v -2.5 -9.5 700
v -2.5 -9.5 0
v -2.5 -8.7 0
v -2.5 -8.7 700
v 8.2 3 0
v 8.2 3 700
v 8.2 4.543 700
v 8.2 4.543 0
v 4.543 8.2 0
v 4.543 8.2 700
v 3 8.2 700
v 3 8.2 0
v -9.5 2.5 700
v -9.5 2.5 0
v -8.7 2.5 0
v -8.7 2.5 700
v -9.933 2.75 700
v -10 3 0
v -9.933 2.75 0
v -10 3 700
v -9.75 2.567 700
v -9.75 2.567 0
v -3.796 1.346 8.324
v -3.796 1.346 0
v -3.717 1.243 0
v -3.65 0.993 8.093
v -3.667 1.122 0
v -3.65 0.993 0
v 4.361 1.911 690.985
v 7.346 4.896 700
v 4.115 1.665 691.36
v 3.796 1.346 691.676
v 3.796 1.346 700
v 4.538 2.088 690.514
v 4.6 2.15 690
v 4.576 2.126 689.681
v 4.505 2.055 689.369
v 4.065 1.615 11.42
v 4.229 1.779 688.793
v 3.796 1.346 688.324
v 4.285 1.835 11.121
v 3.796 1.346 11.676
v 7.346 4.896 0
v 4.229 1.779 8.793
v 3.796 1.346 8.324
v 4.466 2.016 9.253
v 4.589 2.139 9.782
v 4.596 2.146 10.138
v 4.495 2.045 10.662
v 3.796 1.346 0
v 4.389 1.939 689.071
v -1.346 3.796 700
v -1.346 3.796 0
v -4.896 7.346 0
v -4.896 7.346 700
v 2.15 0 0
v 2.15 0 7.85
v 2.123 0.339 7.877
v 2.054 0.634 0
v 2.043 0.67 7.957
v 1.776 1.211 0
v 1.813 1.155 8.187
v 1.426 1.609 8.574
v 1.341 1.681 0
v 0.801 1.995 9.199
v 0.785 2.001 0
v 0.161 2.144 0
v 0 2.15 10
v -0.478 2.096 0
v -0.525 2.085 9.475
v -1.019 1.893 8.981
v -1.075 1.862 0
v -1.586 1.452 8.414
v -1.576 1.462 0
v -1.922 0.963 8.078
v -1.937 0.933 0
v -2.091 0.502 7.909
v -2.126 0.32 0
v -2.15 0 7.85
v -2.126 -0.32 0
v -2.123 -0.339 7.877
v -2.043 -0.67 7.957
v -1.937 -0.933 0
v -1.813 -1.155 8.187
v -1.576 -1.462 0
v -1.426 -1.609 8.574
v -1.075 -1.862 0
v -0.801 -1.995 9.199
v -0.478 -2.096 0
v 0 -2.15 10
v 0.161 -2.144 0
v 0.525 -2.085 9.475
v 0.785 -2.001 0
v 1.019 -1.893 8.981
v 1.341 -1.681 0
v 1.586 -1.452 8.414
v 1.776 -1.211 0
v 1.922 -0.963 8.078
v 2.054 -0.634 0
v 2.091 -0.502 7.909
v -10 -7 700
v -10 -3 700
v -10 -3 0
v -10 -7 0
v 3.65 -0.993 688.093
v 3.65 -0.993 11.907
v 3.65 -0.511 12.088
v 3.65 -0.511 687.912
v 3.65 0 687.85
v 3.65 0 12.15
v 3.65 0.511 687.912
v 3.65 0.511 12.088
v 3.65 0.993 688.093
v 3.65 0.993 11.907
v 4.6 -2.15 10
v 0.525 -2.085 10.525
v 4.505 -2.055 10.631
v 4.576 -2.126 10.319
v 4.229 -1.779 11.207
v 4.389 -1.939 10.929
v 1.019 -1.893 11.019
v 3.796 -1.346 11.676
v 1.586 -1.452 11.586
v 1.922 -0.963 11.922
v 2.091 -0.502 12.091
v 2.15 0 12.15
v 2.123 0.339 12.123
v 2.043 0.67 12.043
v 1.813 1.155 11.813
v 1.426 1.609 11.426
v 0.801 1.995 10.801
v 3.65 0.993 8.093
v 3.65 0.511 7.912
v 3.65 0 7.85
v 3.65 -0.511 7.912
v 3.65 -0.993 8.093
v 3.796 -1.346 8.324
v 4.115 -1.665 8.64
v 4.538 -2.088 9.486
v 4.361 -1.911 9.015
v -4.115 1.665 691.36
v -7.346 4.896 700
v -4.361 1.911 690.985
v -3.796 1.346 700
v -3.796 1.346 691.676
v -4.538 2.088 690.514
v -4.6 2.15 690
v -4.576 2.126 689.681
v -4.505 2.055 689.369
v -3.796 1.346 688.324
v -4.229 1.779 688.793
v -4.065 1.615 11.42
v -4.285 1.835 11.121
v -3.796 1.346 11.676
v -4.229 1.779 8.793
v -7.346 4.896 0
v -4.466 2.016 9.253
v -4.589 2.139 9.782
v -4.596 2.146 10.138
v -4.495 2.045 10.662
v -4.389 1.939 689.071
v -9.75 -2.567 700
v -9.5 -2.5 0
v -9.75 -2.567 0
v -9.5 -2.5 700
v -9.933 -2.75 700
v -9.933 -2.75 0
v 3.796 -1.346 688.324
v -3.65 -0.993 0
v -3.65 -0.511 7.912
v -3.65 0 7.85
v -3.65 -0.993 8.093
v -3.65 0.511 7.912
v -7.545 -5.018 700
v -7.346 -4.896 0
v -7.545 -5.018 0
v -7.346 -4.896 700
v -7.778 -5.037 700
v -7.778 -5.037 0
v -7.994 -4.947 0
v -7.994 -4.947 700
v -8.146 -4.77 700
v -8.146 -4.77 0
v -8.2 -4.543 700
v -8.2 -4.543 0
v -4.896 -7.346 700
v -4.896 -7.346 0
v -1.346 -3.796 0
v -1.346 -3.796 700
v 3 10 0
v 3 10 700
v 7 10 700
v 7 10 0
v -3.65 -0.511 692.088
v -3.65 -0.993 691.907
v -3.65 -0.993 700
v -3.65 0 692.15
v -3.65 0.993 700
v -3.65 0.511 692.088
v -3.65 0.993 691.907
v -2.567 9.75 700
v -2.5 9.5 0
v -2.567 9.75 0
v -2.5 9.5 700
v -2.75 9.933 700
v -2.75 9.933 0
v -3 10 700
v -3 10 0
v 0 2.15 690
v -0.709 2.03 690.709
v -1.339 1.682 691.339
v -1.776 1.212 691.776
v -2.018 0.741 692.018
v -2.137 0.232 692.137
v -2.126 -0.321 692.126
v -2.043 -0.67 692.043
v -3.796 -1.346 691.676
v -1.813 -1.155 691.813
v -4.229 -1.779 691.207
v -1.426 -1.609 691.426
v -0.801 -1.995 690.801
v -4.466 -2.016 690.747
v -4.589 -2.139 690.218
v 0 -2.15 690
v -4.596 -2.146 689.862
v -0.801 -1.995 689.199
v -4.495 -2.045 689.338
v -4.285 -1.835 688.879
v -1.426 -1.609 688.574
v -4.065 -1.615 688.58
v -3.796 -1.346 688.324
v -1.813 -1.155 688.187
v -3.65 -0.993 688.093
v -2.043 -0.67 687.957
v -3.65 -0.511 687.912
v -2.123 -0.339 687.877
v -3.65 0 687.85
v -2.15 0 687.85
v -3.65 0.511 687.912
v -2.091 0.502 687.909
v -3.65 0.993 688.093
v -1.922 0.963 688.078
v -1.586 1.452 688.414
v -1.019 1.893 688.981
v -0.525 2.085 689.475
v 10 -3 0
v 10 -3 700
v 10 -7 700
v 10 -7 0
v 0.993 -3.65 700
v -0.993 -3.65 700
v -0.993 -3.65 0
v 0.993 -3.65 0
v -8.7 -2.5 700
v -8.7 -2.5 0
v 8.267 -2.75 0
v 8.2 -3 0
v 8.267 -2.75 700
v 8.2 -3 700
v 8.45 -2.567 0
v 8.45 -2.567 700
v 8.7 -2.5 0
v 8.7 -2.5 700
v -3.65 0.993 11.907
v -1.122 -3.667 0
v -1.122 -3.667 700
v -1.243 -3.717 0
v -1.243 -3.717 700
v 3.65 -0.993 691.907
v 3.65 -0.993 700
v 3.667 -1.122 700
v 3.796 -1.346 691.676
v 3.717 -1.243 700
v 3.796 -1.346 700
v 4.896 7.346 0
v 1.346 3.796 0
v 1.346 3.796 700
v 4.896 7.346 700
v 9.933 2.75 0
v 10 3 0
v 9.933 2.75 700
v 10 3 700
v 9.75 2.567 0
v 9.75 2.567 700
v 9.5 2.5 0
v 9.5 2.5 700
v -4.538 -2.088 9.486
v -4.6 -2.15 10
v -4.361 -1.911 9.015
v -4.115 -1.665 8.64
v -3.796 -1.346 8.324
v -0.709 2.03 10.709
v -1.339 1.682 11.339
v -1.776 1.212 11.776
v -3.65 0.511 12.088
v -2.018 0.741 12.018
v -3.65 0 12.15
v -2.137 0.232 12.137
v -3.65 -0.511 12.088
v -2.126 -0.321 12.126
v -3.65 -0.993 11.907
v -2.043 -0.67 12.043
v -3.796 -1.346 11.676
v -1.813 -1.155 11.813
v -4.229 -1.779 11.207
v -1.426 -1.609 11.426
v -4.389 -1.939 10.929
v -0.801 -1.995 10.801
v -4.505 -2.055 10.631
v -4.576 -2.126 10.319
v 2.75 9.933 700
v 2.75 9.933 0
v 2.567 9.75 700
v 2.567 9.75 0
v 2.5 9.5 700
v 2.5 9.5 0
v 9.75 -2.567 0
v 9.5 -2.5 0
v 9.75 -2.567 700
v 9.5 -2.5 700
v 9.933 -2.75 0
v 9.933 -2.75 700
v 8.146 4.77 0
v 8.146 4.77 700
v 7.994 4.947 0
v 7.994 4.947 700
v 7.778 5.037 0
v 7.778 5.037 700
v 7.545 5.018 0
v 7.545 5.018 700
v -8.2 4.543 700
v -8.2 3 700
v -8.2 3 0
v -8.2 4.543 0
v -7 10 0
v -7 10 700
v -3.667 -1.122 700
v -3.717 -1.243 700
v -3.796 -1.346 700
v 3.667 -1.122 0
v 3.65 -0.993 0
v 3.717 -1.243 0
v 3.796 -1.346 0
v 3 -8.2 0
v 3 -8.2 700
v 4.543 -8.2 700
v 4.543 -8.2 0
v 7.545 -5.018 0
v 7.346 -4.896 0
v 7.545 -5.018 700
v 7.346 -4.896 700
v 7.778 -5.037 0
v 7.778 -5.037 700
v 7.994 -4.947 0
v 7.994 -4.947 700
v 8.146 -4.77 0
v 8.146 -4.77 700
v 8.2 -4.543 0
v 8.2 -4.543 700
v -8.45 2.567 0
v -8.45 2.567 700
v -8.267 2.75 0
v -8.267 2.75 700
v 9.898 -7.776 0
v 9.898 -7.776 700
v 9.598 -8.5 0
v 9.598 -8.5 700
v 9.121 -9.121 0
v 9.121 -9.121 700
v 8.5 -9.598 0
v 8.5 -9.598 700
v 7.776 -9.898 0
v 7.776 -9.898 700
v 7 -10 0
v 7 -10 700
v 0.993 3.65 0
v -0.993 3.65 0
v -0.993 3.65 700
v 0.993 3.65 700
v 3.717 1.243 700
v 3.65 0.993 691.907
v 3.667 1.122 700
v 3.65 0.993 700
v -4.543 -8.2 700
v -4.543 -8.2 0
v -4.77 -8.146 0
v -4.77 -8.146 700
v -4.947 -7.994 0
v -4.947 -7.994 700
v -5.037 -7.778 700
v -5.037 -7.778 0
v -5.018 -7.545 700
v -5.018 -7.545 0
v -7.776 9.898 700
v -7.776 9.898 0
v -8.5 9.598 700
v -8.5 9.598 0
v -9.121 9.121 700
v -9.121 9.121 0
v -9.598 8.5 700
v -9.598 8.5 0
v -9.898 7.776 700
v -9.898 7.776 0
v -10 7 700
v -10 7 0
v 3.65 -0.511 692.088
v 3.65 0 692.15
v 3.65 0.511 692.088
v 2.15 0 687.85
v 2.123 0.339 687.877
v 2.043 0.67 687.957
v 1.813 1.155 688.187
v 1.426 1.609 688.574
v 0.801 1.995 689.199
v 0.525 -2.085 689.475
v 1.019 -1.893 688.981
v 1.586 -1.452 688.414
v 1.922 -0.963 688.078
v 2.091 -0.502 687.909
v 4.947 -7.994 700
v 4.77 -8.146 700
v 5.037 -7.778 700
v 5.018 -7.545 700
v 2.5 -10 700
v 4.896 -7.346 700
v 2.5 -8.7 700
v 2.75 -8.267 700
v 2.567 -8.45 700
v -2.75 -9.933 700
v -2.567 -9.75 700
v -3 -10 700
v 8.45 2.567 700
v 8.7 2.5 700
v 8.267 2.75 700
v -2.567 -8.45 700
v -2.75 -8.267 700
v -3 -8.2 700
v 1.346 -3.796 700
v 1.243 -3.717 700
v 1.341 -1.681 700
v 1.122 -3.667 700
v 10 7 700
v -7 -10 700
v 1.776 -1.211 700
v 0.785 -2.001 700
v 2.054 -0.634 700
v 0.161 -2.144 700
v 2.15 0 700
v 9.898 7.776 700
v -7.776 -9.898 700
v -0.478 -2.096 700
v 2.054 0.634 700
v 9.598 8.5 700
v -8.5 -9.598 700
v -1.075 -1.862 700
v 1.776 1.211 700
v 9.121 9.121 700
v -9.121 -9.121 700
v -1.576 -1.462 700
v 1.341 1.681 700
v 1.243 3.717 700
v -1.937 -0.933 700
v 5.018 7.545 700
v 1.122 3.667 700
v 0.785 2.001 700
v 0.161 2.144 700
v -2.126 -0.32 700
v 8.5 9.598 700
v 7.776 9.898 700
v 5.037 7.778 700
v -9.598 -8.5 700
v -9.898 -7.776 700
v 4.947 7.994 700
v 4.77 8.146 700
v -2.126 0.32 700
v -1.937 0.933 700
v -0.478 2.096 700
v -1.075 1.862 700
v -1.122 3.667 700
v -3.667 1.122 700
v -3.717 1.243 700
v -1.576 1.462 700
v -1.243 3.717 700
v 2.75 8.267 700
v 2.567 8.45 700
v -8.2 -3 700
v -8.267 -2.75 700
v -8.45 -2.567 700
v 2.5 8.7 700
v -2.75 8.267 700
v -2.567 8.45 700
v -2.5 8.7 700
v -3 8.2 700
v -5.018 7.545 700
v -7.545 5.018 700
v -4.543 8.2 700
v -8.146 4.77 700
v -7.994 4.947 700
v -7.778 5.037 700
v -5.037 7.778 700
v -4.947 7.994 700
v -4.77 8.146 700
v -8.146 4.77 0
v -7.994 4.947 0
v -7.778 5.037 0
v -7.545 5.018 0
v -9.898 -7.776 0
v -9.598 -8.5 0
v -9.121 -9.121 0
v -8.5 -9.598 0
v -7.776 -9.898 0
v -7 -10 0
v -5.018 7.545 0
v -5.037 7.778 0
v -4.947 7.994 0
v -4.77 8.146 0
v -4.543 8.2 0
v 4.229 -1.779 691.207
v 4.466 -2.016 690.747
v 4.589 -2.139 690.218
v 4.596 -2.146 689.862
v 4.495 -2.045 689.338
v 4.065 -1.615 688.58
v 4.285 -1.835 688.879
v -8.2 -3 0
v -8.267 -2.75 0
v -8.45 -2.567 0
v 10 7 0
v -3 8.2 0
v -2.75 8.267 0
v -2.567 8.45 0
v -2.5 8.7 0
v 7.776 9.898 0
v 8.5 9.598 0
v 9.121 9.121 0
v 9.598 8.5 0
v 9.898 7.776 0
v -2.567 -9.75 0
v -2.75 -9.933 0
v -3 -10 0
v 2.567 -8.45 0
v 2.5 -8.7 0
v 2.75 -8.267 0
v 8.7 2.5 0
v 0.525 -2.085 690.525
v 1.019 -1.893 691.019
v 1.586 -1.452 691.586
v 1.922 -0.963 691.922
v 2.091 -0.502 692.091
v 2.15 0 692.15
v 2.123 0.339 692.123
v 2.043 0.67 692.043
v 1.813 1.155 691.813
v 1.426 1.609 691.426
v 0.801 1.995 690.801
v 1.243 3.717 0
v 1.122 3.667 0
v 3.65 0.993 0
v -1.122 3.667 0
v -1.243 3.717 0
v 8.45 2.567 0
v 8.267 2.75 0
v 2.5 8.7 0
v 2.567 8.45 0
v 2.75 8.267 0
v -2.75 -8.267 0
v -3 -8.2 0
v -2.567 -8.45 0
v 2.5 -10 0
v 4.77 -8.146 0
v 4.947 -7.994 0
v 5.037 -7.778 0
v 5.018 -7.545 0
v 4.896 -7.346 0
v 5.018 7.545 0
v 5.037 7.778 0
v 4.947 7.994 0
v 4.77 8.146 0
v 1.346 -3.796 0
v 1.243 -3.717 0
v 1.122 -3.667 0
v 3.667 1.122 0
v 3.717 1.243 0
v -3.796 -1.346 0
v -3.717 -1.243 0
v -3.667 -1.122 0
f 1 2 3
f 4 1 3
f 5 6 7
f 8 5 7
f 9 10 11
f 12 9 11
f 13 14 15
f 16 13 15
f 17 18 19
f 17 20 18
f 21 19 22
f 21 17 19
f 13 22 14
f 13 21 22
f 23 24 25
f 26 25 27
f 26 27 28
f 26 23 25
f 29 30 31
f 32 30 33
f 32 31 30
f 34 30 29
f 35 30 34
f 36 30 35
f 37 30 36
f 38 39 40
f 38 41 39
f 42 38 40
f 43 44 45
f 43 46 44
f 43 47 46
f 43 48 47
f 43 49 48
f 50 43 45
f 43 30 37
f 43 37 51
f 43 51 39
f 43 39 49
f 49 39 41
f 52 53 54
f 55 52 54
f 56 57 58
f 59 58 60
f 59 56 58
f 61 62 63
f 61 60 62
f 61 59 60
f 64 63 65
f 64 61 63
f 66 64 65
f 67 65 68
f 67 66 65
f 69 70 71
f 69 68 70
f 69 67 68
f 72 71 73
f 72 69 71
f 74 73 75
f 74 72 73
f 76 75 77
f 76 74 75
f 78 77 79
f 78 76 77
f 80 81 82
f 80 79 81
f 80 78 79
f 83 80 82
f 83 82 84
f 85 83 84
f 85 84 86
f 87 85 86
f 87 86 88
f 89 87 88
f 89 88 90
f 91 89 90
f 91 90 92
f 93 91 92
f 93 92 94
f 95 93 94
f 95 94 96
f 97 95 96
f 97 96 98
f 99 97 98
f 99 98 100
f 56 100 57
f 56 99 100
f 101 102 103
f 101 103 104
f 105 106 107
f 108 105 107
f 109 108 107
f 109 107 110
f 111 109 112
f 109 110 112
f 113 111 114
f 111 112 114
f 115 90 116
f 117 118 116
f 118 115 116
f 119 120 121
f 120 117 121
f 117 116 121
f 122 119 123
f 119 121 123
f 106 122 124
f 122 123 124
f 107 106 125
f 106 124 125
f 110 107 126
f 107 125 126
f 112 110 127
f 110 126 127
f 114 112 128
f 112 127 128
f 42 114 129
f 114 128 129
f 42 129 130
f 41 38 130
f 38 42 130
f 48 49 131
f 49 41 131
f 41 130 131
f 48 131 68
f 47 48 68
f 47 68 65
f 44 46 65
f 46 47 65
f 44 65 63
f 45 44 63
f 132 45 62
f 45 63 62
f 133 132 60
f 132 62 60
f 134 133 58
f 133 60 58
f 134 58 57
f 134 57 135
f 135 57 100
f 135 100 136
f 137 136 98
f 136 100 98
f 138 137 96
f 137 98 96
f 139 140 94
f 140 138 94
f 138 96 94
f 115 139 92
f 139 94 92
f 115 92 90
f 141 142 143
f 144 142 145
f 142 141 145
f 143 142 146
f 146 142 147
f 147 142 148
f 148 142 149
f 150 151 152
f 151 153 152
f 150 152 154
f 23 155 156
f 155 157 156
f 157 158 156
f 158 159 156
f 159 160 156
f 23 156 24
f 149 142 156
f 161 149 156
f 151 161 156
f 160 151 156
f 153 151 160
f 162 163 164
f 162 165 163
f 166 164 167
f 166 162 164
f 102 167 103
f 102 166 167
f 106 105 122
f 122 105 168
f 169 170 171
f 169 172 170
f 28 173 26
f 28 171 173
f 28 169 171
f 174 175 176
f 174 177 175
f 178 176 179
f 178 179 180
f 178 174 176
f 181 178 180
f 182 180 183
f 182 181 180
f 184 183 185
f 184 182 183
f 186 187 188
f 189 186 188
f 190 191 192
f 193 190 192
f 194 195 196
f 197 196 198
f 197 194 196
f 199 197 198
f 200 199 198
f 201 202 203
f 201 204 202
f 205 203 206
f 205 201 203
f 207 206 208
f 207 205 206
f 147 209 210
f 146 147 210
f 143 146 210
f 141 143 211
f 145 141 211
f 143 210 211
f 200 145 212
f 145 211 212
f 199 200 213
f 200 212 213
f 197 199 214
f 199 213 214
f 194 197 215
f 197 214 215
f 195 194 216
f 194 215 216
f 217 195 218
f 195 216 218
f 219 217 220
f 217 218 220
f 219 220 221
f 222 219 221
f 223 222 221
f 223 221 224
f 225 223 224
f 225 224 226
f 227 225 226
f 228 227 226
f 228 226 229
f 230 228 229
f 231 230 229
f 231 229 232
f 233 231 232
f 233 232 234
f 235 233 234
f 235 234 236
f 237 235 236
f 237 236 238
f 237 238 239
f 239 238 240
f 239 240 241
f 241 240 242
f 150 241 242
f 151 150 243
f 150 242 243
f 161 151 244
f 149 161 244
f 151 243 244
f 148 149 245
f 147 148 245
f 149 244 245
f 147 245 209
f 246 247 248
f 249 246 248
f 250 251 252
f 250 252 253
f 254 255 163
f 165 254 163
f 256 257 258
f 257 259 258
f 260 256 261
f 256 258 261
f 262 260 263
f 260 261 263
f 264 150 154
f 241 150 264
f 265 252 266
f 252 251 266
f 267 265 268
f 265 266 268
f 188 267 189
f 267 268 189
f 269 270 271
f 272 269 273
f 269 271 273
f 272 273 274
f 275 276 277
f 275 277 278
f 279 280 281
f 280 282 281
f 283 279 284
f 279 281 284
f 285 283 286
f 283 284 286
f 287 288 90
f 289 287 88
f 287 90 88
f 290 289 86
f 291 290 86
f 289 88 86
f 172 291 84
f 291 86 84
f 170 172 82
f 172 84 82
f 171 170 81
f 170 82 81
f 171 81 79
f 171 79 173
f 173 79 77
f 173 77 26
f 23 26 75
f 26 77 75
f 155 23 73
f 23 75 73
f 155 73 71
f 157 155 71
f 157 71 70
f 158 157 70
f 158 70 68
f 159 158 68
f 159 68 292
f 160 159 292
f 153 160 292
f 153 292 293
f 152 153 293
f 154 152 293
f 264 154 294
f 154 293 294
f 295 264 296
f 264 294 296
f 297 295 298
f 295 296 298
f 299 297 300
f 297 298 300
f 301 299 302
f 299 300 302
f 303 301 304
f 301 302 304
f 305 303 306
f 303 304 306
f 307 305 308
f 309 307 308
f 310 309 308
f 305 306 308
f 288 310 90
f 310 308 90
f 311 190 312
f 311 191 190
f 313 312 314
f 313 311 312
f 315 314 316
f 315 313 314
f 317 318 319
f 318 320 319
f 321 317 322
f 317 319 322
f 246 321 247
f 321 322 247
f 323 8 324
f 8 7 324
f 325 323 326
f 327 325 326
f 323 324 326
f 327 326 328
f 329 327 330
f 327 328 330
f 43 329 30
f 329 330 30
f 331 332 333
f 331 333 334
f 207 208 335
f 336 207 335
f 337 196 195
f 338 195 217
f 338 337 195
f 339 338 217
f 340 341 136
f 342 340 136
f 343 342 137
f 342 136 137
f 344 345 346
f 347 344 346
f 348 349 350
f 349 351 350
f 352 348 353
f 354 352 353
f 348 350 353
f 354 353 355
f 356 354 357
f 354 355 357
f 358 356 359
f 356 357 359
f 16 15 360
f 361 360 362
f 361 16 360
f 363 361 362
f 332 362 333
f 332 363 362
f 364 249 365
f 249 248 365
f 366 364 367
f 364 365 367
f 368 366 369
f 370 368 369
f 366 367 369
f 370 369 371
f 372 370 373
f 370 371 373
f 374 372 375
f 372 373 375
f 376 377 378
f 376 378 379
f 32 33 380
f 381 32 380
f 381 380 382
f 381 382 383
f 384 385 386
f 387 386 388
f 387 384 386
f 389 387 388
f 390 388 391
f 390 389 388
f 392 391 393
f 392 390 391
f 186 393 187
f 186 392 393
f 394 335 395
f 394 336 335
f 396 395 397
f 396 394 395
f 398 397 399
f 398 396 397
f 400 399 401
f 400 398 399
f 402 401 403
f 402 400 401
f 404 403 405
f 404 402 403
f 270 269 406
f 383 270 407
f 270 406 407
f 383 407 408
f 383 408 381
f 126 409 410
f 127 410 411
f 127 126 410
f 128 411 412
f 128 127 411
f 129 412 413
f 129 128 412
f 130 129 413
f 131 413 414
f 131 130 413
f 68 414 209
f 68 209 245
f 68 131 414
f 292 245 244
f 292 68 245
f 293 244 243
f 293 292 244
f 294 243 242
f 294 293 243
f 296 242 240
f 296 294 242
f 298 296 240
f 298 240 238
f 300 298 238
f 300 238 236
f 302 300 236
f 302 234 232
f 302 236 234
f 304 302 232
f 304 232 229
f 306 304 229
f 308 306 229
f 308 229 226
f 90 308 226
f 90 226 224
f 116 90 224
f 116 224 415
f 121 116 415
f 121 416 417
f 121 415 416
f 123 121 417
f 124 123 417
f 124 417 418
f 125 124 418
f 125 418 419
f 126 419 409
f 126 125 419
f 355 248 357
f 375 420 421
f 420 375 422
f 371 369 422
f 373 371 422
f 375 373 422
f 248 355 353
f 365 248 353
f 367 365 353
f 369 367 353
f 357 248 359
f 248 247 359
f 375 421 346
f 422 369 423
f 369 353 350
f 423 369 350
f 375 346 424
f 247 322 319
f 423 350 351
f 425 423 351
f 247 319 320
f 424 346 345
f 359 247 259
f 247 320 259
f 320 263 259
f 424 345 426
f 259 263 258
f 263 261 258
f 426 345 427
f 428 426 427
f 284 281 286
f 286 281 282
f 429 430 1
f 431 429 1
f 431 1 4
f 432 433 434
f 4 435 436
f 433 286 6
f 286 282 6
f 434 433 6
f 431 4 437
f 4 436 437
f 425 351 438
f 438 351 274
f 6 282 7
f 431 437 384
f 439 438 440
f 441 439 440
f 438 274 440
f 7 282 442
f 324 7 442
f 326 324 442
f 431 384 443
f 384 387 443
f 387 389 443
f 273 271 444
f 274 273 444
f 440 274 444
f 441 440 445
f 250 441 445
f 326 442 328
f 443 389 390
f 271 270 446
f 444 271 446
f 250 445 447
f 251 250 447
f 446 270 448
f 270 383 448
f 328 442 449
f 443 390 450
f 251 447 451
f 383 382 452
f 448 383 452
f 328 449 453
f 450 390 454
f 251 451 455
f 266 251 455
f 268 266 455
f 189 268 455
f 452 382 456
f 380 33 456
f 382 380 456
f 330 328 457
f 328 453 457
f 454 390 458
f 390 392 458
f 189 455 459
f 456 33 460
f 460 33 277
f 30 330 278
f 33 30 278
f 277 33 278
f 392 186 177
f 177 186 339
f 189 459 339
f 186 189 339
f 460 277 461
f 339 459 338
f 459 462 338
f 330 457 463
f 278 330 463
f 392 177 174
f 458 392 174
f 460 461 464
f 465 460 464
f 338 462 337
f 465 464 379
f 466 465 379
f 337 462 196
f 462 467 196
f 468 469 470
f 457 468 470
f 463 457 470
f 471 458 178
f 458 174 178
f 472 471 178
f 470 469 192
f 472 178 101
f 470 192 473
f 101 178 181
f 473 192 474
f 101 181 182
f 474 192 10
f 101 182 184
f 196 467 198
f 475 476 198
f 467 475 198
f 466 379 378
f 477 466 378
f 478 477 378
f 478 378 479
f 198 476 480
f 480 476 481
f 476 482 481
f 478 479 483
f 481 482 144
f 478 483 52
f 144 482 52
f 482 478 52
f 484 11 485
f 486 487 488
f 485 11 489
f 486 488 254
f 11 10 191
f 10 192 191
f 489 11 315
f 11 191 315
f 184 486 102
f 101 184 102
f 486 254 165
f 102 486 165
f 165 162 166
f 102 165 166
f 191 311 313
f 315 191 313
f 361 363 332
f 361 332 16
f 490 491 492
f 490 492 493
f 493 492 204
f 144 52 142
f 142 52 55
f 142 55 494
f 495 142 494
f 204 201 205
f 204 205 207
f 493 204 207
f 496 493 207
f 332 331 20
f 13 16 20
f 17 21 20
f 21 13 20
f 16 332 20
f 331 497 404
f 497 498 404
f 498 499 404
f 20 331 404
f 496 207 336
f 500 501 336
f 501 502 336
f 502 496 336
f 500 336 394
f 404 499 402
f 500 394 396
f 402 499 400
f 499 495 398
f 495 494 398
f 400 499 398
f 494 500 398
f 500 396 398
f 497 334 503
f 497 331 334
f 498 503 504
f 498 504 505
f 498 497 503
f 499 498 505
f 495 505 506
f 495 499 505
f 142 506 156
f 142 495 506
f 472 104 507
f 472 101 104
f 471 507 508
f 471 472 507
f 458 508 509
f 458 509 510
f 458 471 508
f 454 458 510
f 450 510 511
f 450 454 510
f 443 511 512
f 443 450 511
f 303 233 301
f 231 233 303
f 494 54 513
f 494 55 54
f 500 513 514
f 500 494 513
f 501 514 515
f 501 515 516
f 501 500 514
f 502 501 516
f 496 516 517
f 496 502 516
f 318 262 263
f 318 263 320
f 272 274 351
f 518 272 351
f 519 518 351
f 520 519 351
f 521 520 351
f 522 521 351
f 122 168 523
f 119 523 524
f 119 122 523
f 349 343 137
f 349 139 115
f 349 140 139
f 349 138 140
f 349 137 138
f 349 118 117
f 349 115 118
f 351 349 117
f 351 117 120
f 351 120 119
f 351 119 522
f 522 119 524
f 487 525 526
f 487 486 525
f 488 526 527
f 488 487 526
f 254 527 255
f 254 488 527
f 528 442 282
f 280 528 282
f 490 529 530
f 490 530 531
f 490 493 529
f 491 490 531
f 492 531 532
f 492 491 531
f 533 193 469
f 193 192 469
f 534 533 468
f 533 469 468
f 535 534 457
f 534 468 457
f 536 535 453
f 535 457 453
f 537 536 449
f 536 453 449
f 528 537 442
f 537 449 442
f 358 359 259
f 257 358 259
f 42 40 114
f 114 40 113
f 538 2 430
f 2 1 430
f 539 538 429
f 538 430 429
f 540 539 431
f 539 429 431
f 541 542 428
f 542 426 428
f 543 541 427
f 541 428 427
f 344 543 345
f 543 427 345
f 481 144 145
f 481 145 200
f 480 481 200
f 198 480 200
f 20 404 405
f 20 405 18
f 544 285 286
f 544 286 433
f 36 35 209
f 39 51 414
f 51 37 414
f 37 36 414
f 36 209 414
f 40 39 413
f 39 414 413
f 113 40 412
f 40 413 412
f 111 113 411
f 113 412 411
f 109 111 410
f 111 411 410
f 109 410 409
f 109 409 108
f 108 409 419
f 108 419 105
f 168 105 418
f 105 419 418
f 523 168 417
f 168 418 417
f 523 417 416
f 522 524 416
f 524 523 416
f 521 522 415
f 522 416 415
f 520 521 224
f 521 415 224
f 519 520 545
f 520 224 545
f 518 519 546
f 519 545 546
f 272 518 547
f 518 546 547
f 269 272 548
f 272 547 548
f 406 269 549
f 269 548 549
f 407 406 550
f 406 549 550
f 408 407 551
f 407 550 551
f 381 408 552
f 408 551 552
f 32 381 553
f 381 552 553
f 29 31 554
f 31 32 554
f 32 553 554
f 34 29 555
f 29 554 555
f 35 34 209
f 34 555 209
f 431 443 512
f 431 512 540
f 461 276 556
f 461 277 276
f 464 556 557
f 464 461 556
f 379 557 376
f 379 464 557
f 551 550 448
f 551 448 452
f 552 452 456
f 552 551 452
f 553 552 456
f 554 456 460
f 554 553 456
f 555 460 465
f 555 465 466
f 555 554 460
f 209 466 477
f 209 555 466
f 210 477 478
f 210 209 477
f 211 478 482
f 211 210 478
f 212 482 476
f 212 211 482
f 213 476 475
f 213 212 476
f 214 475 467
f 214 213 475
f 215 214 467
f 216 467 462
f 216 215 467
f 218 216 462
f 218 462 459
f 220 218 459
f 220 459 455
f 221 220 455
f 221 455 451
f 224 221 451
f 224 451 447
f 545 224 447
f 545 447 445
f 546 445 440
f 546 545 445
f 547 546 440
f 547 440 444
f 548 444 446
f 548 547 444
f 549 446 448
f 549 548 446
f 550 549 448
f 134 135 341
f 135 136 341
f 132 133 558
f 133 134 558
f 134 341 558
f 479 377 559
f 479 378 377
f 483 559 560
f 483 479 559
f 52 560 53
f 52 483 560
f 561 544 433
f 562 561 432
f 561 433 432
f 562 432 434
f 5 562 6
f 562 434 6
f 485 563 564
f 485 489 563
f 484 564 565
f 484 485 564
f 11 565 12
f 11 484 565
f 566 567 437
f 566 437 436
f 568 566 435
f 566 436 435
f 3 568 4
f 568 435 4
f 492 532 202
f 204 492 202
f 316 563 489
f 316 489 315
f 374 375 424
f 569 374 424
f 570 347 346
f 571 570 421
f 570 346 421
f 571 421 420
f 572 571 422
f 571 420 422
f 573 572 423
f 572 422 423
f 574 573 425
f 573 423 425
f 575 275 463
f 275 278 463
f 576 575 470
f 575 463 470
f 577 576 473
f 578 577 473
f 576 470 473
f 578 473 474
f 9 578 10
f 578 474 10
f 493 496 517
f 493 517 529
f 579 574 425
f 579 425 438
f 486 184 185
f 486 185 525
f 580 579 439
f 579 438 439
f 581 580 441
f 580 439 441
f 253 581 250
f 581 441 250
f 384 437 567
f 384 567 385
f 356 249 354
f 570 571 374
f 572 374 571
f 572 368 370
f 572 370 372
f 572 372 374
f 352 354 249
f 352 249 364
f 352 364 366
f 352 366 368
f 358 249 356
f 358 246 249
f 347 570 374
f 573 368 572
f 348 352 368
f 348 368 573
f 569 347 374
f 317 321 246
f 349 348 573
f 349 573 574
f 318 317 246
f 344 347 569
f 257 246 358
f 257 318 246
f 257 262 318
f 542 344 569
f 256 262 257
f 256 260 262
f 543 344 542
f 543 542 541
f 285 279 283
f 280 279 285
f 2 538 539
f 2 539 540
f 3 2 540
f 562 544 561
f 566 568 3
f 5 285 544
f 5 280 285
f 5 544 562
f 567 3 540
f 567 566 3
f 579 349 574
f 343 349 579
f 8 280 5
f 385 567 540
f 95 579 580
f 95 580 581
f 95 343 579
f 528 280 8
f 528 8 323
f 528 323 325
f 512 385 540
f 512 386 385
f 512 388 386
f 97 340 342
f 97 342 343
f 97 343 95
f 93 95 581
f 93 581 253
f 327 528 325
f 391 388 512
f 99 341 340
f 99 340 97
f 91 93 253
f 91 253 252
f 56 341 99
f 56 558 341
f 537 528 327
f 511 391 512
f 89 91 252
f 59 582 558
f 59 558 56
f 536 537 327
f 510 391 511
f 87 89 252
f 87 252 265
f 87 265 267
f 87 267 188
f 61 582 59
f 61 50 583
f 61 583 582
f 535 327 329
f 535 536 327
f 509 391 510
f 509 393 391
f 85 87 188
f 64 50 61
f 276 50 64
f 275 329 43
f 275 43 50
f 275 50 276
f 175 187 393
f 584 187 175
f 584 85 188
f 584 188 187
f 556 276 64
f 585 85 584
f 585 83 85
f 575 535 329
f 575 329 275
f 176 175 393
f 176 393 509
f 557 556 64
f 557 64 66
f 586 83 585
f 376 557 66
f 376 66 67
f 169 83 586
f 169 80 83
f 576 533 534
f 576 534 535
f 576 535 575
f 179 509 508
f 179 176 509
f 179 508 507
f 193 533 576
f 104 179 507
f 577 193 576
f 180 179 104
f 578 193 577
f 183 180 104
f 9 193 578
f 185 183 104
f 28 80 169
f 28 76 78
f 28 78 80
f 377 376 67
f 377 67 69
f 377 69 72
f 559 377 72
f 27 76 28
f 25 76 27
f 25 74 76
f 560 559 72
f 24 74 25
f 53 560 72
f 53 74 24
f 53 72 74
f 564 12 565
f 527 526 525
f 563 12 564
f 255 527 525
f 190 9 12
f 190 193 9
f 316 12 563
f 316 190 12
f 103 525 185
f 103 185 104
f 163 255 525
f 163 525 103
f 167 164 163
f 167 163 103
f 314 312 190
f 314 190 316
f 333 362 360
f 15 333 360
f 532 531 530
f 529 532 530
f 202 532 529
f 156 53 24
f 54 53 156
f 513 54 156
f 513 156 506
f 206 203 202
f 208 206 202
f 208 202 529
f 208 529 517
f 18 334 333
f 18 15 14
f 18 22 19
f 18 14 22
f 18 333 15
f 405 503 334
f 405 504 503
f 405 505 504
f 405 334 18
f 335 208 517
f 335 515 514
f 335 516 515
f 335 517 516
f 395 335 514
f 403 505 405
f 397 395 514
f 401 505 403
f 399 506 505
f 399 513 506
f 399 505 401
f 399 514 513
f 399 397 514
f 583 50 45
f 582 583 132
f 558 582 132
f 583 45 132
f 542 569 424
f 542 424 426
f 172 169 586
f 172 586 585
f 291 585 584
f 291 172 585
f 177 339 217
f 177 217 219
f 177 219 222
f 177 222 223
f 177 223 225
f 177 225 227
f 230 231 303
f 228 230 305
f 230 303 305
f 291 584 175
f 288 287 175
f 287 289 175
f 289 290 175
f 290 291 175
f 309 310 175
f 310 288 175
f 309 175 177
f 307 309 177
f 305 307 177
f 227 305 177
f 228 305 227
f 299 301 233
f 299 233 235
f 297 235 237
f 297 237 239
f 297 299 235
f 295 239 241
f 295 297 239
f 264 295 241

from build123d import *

# Parameters (mm, degrees)
SKETCH1_W           = 7.3
SKETCH1_H           = 7.3
SKETCH1_R           = 2.15
BOSS_EXTRUDE1_DEPTH = 700
BOSS_EXTRUDE2_DEPTH = 700
FILLET4_R           = 3
FILLET5_R           = 0.5
FILLET6_R           = 0.5
FILLET7_R           = 0.5
SKETCH3_R           = 2.15
CUT_EXTRUDE1_DEPTH  = 701.204486204
SKETCH4_R           = 2.15
CUT_EXTRUDE2_DEPTH  = 701.204486304
SKETCH5_R           = 2.15
CUT_EXTRUDE3_DEPTH  = 701.204486304
SKETCH6_R           = 2.15
CUT_EXTRUDE4_DEPTH  = 701.204486304


with BuildPart() as part:
    # Sketch1 → Boss-Extrude1 (new body)
    with BuildSketch(Plane.XY):
        Rectangle(SKETCH1_W, SKETCH1_H)
        Circle(SKETCH1_R, mode=Mode.SUBTRACT)
    extrude(amount=BOSS_EXTRUDE1_DEPTH)

    # Sketch2 → Boss-Extrude2 (add)
    with BuildSketch(Plane.XY):
        Polygon((3.65, 3.65), (1.2, 3.65), (5.750000001, 8.200000001), (2.500000001, 8.200000001), (2.500000001, 10.000000001), (10.000000001, 10.000000001), (10.000000001, 2.500000001), (8.200000001, 2.500000001), (8.200000001, 5.750000001), (3.65, 1.2), align=None)
        Polygon((-3.65, 3.65), (-1.2, 3.65), (-5.750000001, 8.200000001), (-2.500000001, 8.200000001), (-2.500000001, 10.000000001), (-10.000000001, 10.000000001), (-10.000000001, 2.500000001), (-8.200000001, 2.500000001), (-8.200000001, 5.750000001), (-3.65, 1.2), align=None)
        Polygon((-3.65, -3.65), (-3.65, -1.2), (-8.200000001, -5.750000001), (-8.200000001, -2.500000001), (-10.000000001, -2.500000001), (-10.000000001, -10.000000001), (-2.500000001, -10.000000001), (-2.500000001, -8.200000001), (-5.750000001, -8.200000001), (-1.2, -3.65), align=None)
        Polygon((3.65, -3.65), (3.65, -1.2), (8.200000001, -5.750000001), (8.200000001, -2.500000001), (10.000000001, -2.500000001), (10.000000001, -10.000000001), (2.500000001, -10.000000001), (2.500000001, -8.200000001), (5.750000001, -8.200000001), (1.2, -3.65), align=None)
    extrude(amount=BOSS_EXTRUDE2_DEPTH)

    # Fillet4
    fillet4_edges = [part.edges().sort_by_distance(p)[0] for p in [
        (10.000000001, 10.000000001, 350),
        (-10.000000001, 10.000000001, 350),
        (-10.000000001, -10.000000001, 350),
        (10.000000001, -10.000000001, 350),
    ]]
    fillet(fillet4_edges, radius=FILLET4_R)

    # Fillet5
    fillet5_edges = [part.edges().sort_by_distance(p)[0] for p in [
        (8.200000001, 2.500000001, 350),
        (10.000000001, 2.500000001, 350),
        (2.500000001, 10.000000001, 350),
        (2.500000001, 8.200000001, 350),
        (-2.500000001, 8.200000001, 350),
        (-2.500000001, 10.000000001, 350),
        (-10.000000001, 2.500000001, 350),
        (-8.200000001, 2.500000001, 350),
        (-8.200000001, -2.500000001, 350),
        (-10.000000001, -2.500000001, 350),
        (-2.500000001, -10.000000001, 350),
        (-2.500000001, -8.200000001, 350),
        (2.500000001, -8.200000001, 350),
        (10.000000001, -2.500000001, 350),
        (8.200000001, -2.500000001, 350),
    ]]
    fillet(fillet5_edges, radius=FILLET5_R)

    # Fillet6
    fillet6_edges = [part.edges().sort_by_distance(p)[0] for p in [
        (3.65, 1.2, 350),
        (1.2, 3.65, 350),
        (-3.65, 1.2, 350),
        (-1.2, 3.65, 350),
        (-1.2, -3.65, 350),
        (-3.65, -1.2, 350),
        (1.2, -3.65, 350),
        (3.65, -1.2, 350),
    ]]
    fillet(fillet6_edges, radius=FILLET6_R)

    # Fillet7
    fillet7_edges = [part.edges().sort_by_distance(p)[0] for p in [
        (8.200000001, 5.750000001, 350),
        (5.750000001, 8.200000001, 350),
        (-5.750000001, 8.200000001, 350),
        (-8.200000001, 5.750000001, 350),
        (-8.200000001, -5.750000001, 350),
        (-5.750000001, -8.200000001, 350),
        (5.750000001, -8.200000001, 350),
        (8.200000001, -5.750000001, 350),
    ]]
    fillet(fillet7_edges, radius=FILLET7_R)

    # Sketch3 → Cut-Extrude1 (cut, through all)
    with BuildSketch(Plane.ZY.offset(3.65)):
        with Locations(Location((10, 0, 0), (0, 0, 270))):
            Circle(SKETCH3_R)
    extrude(amount=-CUT_EXTRUDE1_DEPTH, mode=Mode.SUBTRACT)

    # Sketch4 → Cut-Extrude2 (cut, through all)
    with BuildSketch(Plane(origin=(3.65, 0, 0), x_dir=(0, 0, -1), z_dir=(1, 0, 0))):
        with Locations(Location((-10, 0, 0), (0, 0, 270))):
            Circle(SKETCH4_R)
    extrude(amount=-CUT_EXTRUDE2_DEPTH, mode=Mode.SUBTRACT)

    # Sketch5 → Cut-Extrude3 (cut, through all)
    with BuildSketch(Plane(origin=(3.65, 0, 0), x_dir=(0, 0, -1), z_dir=(1, 0, 0))):
        with Locations(Location((-690, 0, 0), (0, 0, 90))):
            Circle(SKETCH5_R)
    extrude(amount=-CUT_EXTRUDE3_DEPTH, mode=Mode.SUBTRACT)

    # Sketch6 → Cut-Extrude4 (cut, through all)
    with BuildSketch(Plane.ZY.offset(3.65)):
        with Locations(Location((690, 0, 0), (0, 0, 90))):
            Circle(SKETCH6_R)
    extrude(amount=-CUT_EXTRUDE4_DEPTH, mode=Mode.SUBTRACT)


solid = part.part
